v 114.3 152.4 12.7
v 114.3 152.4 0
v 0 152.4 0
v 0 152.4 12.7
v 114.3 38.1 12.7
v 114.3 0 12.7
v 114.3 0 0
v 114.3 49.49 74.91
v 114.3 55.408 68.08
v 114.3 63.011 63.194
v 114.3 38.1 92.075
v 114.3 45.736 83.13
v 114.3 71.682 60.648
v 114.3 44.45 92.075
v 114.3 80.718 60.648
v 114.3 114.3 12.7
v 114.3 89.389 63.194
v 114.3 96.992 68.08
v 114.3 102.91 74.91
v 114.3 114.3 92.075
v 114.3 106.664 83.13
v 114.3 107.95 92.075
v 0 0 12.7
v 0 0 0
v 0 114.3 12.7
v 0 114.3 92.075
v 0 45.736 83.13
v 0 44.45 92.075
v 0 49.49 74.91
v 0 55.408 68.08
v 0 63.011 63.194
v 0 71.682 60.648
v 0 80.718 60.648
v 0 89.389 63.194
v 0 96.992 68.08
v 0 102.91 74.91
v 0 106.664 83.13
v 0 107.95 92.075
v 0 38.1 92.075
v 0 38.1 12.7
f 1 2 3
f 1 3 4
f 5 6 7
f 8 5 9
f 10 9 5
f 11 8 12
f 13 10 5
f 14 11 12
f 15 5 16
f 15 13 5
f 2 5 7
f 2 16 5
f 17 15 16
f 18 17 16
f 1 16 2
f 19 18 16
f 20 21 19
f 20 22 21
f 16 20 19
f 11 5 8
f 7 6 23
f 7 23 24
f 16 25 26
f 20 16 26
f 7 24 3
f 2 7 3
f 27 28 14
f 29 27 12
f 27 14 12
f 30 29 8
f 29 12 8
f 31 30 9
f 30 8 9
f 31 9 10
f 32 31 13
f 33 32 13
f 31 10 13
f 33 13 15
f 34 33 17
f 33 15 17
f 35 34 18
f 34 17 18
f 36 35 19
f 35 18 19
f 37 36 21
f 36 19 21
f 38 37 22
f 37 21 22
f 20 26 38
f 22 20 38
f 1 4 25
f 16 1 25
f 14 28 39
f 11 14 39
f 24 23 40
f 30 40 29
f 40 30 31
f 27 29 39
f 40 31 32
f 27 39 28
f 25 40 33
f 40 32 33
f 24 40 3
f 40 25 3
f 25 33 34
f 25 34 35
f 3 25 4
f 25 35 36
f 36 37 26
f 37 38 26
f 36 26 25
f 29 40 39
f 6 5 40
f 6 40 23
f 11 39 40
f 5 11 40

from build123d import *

# Parameters (mm, degrees)
F1_DEPTH = 114.3
F3_DEPTH = 114.301


with BuildPart() as f1:
    # F0 (on Right) → F1 (new body)
    with BuildSketch(Plane.YZ):
        Polygon((0, 12.7), (0, 0), (152.4, 0), (152.4, 12.7), (114.3, 12.7), (114.3, 92.075), (38.1, 92.075), (38.1, 12.7), align=None)
    extrude(amount=F1_DEPTH)

    # F2 (on face) → F3 (cut, through all)
    with BuildSketch(Plane.YZ.offset(114.3)):
        with BuildLine():
            ThreePointArc((44.45, 92.075), (76.2, 60.325), (107.95, 92.075))
            Line((107.95, 92.075), (44.45, 92.075))
        make_face()
    extrude(amount=-F3_DEPTH, mode=Mode.SUBTRACT)


solid = f1.part
